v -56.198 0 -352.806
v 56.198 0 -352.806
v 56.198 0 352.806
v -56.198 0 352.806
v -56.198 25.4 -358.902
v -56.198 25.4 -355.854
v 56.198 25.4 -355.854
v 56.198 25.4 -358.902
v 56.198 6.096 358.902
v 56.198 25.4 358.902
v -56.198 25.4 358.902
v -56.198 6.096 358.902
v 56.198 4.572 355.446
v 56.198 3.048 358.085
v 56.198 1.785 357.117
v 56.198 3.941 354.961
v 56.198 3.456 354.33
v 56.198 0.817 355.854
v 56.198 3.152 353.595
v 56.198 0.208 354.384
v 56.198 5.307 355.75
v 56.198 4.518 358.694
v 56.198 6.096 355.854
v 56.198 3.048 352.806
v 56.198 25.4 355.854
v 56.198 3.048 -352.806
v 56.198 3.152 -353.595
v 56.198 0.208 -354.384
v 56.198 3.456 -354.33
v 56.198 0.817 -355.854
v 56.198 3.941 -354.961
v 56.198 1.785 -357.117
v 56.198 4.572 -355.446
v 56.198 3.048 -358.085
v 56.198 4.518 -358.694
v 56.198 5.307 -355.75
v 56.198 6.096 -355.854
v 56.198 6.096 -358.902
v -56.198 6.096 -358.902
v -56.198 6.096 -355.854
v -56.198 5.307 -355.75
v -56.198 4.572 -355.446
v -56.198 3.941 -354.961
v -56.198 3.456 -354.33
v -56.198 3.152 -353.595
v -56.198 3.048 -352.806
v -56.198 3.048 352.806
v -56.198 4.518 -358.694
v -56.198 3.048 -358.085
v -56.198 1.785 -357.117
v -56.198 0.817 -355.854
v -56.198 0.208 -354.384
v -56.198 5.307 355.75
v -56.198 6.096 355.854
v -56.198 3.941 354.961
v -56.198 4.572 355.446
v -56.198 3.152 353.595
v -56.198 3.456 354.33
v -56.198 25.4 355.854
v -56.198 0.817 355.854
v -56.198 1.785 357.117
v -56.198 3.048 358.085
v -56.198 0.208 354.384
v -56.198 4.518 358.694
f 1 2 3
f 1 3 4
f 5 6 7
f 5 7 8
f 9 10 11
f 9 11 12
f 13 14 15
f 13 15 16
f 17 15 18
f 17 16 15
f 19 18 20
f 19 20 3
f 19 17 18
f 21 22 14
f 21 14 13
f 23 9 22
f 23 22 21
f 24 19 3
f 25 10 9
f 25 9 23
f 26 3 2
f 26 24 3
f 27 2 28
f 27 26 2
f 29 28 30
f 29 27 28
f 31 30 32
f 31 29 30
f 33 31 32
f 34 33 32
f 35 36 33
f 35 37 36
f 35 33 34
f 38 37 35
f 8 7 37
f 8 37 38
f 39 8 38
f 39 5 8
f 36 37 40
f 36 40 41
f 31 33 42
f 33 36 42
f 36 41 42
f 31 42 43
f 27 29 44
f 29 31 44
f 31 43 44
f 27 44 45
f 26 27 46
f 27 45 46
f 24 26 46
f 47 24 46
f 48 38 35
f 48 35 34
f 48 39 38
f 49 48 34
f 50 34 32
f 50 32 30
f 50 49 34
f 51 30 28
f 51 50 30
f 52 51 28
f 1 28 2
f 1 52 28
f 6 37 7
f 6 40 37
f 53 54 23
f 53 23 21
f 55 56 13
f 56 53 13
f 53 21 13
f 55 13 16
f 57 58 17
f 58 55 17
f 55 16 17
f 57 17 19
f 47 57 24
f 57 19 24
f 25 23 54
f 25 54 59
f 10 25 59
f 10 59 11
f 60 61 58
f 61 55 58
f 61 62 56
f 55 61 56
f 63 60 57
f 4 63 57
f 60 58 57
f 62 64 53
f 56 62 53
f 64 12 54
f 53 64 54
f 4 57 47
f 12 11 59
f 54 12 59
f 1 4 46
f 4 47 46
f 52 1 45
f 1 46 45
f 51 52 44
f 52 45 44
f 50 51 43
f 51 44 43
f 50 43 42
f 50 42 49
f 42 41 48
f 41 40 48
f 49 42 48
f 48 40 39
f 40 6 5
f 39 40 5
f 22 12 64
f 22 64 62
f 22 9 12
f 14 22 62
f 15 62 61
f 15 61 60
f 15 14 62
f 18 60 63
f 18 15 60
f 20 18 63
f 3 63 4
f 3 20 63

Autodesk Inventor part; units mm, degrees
ref_plane "YZ Plane" through (0, 0, 0) normal (1, 0, 0) x (0, 1, 0)
ref_plane "XZ Plane" through (0, 0, 0) normal (0, 1, 0) x (-1, 0, 0)
ref_plane "XY Plane" through (0, 0, 0) normal (0, 0, 1) x (1, 0, 0)
sketch "Sketch1" plane through (0, 0, 0) normal (0, 1, 0) x (-1, 0, 0)
  line L0 (-56.1975, 358.902) -> (56.1975, 358.902)
  line L1 (56.1975, 358.902) -> (56.1975, -358.902)
  line L2 (56.1975, -358.902) -> (-56.1975, -358.902)
  line L3 (-56.1975, -358.902) -> (-56.1975, 358.902)
  line L4 (-56.1975, 358.902) -> (56.1975, -358.902) construction
  line L5 (56.1975, 358.902) -> (-56.1975, -358.902) construction
  point P0 (0, 0)
  dimension "d0" = 112.395
  dimension "d1" = 717.804
extrude "Plate1" add sketch "Sketch1" along normal blind 3.048
sketch "Sketch2" plane through (56.1975, 0, 355.854) normal (0, 0, 1) x (1, 0, 0)
  line L0 (-112.395, 0) -> (0, 0)
  line L1 (0, 0) -> (0, 25.4)
  line L2 (0, 25.4) -> (-112.395, 25.4)
  line L3 (-112.395, 25.4) -> (-112.395, 0)
edge flange "Flange1" height 25.4 angle 90 thickness 3.048 bend radius 3.048 thickness toward (0, 0, 1) relief straight relief width 3.048 relief depth 1.524 corner gap 3.048 corner form 0 edges at (0, 3.048, 358.902) (0, 3.048, -358.902) wall of the first edge with corners at (-56.1975, 0, 355.854) (56.1975, 0, 355.854) (56.1975, 25.4, 355.854) (-56.1975, 25.4, 355.854)
bend "Bend1"
corner "Corner1"
equation "\"d5\" = BendReliefWidth"
equation "\"d6\" = BendReliefDepth"
equation "\"d7\" = MinimumRemnant"
equation "\"d8\" = BendRadius"
equation "\"d11\" = BendRadius"
equation "\"d12\" = CornerReliefSize"
equation "\"d13\" = GapSize"
equation "\"d14\" = JacobiRadiusSize"
equation "\"BendRadius\" = Thickness"
equation "\"BendReliefWidth\" = Thickness"
equation "\"BendReliefDepth\" = 0.5 * Thickness"
equation "\"CornerReliefSize\" = 4 * Thickness"
equation "\"MinimumRemnant\" = 2 * Thickness"
equation "\"TransitionRadius\" = BendRadius"
equation "\"JacobiRadiusSize\" = Thickness"
equation "\"GapSize\" = Thickness"
equation "\"d4\" = BendRadius"
equation "\"Thickness\" = 3.048"
properties part number "Side Gurad"
